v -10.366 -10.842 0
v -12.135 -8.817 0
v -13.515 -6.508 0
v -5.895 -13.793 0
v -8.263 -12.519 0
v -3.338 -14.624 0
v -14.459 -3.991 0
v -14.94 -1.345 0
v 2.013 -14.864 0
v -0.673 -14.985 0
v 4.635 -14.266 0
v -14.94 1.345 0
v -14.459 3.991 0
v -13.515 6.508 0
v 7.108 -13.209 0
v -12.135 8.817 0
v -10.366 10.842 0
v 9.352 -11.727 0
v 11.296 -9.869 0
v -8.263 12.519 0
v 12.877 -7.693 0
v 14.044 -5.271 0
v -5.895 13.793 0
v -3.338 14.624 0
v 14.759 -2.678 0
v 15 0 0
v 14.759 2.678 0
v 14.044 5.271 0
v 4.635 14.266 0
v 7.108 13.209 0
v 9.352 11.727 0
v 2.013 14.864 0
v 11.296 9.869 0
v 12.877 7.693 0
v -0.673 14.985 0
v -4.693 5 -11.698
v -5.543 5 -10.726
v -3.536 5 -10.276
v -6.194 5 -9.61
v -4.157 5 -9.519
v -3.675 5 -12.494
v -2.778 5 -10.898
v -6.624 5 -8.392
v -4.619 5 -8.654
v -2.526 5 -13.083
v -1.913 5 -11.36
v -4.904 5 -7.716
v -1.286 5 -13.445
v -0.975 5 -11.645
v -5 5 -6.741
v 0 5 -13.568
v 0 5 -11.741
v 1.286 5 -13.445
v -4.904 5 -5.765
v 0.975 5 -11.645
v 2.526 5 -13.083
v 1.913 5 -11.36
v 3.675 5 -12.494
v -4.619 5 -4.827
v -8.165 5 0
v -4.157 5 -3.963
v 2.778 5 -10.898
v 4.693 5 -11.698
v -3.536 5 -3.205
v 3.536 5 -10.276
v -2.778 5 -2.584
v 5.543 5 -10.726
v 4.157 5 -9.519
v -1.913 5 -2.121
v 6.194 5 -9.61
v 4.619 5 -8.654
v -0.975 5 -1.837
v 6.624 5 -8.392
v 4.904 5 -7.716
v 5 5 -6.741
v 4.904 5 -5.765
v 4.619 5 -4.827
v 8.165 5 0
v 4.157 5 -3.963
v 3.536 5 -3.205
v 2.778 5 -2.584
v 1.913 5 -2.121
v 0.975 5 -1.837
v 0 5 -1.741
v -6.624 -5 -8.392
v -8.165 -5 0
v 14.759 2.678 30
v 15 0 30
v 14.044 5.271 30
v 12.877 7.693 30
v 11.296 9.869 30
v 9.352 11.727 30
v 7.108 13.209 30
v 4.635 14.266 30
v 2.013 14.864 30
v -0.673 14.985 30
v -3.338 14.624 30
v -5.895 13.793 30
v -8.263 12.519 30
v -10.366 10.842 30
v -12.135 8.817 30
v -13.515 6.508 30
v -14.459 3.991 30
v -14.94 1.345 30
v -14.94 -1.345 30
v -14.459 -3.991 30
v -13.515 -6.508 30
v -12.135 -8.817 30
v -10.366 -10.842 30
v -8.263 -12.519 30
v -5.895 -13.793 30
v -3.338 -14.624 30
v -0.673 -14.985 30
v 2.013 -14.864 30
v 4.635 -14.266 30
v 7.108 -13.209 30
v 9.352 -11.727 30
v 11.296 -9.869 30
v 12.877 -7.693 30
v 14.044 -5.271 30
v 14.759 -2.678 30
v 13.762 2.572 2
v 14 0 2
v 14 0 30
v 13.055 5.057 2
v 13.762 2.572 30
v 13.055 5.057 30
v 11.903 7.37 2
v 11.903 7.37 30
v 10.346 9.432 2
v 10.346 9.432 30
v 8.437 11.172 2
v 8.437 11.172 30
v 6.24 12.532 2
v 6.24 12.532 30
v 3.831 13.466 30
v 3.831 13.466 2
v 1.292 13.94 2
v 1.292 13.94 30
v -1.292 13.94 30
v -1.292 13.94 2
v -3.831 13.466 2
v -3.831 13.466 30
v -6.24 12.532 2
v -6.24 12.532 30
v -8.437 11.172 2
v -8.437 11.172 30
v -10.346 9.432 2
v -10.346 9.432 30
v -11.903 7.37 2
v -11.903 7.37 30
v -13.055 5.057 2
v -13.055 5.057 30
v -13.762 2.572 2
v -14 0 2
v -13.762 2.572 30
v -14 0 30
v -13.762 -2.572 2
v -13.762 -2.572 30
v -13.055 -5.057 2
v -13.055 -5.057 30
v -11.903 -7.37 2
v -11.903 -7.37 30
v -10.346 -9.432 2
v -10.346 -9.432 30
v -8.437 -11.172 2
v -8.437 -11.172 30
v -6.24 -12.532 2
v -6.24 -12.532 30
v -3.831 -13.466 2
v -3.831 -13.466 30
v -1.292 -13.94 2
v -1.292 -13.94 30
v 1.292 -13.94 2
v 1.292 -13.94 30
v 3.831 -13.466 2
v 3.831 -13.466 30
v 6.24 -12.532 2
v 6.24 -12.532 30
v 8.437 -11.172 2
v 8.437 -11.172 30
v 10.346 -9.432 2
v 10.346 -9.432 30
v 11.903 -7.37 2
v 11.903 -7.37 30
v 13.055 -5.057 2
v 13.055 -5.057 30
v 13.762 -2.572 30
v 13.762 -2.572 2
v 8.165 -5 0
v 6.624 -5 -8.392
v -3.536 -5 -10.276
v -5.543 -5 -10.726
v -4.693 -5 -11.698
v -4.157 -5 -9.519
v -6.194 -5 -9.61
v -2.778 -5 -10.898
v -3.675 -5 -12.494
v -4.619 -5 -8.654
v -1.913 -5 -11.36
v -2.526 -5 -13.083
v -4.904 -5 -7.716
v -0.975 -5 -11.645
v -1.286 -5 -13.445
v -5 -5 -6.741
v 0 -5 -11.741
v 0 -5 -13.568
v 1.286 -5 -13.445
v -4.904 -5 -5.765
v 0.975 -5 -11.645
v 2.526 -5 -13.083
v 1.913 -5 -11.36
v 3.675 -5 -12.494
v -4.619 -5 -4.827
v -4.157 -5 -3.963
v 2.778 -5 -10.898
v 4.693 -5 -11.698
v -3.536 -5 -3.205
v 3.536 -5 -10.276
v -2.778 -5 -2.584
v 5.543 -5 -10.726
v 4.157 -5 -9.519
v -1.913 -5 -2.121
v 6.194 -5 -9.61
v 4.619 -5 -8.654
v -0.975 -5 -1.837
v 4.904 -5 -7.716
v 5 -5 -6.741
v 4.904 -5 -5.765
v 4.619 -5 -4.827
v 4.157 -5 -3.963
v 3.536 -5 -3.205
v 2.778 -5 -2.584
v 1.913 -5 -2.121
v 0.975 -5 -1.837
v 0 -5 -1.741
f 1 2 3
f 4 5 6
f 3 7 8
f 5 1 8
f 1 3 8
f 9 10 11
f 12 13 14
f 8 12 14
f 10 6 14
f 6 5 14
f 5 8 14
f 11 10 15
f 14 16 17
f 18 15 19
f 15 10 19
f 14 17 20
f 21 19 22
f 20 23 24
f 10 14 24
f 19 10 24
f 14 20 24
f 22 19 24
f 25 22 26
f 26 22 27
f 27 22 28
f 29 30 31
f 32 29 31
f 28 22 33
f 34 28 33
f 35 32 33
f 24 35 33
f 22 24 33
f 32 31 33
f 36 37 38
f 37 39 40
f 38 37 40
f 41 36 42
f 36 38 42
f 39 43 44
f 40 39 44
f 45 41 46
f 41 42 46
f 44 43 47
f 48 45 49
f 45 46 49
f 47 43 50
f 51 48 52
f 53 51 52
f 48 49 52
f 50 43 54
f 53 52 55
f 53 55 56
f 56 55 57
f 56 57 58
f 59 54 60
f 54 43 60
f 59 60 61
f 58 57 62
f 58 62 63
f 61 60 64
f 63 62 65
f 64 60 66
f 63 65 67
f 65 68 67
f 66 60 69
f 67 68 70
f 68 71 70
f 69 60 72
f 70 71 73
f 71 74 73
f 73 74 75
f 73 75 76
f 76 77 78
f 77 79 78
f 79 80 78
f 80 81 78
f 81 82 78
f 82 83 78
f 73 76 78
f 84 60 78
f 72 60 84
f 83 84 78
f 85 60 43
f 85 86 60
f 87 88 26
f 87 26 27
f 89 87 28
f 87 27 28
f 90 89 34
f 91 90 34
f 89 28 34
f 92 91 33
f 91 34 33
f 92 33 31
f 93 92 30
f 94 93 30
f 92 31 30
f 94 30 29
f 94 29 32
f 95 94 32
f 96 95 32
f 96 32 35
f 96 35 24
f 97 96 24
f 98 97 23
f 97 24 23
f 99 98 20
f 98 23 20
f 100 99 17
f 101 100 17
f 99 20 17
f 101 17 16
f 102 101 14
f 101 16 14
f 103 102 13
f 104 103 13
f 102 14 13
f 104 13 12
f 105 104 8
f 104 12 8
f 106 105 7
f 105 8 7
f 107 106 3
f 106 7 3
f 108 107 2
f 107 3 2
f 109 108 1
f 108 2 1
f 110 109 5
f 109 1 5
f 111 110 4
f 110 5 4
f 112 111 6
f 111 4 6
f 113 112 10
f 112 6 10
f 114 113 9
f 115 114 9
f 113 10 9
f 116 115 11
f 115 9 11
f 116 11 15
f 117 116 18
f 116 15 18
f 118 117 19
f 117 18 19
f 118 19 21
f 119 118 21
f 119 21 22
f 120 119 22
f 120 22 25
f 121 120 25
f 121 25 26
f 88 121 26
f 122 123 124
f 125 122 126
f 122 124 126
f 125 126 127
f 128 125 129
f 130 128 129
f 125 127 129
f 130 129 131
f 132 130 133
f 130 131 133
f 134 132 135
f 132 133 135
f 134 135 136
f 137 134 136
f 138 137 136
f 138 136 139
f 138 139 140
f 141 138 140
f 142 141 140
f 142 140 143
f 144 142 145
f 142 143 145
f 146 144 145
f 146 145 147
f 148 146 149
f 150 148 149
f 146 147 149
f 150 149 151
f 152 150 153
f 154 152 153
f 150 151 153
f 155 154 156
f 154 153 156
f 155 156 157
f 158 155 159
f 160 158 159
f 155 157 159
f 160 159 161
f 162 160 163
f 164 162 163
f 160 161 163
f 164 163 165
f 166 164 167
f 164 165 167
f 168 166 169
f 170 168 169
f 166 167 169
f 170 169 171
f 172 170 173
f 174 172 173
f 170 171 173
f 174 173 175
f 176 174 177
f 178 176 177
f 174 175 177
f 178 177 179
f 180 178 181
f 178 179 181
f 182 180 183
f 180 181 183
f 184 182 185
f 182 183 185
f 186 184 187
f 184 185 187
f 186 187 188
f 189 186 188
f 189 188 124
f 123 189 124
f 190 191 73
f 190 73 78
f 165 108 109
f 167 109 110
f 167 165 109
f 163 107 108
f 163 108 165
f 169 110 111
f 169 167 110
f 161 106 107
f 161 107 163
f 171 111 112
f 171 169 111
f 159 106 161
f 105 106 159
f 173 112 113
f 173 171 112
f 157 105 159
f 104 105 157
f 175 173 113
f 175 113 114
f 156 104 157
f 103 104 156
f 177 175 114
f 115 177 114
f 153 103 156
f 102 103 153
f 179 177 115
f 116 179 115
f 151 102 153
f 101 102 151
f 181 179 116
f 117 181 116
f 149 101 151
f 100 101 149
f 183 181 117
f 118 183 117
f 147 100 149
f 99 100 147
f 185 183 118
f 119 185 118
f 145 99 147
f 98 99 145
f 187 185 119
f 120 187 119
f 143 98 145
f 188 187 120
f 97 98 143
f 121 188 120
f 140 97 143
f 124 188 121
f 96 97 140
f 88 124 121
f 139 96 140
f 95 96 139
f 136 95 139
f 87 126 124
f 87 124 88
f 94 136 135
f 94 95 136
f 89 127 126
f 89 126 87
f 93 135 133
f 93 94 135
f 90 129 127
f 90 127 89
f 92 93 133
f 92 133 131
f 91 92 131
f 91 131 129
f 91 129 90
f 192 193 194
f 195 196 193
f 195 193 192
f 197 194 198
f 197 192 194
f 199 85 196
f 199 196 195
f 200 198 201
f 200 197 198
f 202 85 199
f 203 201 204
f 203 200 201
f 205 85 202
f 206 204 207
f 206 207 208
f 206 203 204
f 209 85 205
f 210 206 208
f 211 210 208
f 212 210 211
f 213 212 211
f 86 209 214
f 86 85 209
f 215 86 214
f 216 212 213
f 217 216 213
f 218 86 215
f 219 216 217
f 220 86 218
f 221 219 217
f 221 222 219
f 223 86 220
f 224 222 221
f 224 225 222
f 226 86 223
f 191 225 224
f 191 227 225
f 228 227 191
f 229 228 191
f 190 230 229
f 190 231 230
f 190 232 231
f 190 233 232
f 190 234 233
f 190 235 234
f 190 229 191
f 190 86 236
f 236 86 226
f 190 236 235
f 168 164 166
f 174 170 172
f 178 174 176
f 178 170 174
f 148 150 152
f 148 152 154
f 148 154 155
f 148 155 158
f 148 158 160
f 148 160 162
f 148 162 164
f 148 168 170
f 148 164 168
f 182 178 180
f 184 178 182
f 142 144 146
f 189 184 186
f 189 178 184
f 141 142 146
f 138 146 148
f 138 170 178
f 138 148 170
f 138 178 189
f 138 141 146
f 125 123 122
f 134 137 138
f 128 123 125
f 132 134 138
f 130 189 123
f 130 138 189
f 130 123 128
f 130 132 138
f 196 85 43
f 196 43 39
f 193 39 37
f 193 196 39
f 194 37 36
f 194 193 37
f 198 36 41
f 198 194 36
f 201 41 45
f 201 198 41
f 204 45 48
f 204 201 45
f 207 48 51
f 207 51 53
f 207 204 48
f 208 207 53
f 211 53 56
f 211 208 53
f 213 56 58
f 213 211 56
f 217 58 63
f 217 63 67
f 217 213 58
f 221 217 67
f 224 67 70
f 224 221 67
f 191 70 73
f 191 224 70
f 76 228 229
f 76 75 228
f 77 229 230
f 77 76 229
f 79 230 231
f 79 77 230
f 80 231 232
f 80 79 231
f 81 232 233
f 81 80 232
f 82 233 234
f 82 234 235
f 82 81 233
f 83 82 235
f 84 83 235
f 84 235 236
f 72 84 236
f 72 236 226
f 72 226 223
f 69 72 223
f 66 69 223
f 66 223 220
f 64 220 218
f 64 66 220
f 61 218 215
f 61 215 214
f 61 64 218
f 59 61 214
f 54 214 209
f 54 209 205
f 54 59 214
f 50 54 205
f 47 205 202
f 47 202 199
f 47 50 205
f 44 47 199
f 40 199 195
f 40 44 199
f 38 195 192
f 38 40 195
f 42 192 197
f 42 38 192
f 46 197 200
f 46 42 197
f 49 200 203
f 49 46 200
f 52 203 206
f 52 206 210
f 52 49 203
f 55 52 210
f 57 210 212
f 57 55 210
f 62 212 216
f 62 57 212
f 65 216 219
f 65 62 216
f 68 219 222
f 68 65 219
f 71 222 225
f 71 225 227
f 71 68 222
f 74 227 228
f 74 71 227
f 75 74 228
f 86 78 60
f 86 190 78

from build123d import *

# Parameters (mm, degrees)
F0_R     = 15
F1_DEPTH = 30
F2_R     = 14
F3_DEPTH = 28
F4_R     = 5
F5_DEPTH = 5


with BuildPart() as f1:
    # F0 (on Top) → F1 (new body)
    with BuildSketch(Plane.XY):
        Circle(F0_R)
    extrude(amount=F1_DEPTH)

    # F2 (on face) → F3 (cut)
    with BuildSketch(Plane.XY.offset(30)):
        Circle(F2_R)
    extrude(amount=-F3_DEPTH, mode=Mode.SUBTRACT)


with BuildPart() as f5:
    # F4 (on Front) → F5 (new body, symmetric)
    with BuildSketch(Plane.XZ):
        with BuildLine():
            Line((-8.164535112, 0), (-6.6240113229, -8.391850628))
            ThreePointArc((-6.6240113229, -8.391850628), (0, -13.5675125447), (6.6240113229, -8.391850628))
            Line((6.6240113229, -8.391850628), (8.164535112, 0))
            Line((8.164535112, 0), (-8.164535112, 0))
        make_face()
        with Locations((0, -6.7408492677)):
            Circle(F4_R, mode=Mode.SUBTRACT)
    extrude(amount=F5_DEPTH, both=True)


solid = Compound([f1.part, f5.part])
